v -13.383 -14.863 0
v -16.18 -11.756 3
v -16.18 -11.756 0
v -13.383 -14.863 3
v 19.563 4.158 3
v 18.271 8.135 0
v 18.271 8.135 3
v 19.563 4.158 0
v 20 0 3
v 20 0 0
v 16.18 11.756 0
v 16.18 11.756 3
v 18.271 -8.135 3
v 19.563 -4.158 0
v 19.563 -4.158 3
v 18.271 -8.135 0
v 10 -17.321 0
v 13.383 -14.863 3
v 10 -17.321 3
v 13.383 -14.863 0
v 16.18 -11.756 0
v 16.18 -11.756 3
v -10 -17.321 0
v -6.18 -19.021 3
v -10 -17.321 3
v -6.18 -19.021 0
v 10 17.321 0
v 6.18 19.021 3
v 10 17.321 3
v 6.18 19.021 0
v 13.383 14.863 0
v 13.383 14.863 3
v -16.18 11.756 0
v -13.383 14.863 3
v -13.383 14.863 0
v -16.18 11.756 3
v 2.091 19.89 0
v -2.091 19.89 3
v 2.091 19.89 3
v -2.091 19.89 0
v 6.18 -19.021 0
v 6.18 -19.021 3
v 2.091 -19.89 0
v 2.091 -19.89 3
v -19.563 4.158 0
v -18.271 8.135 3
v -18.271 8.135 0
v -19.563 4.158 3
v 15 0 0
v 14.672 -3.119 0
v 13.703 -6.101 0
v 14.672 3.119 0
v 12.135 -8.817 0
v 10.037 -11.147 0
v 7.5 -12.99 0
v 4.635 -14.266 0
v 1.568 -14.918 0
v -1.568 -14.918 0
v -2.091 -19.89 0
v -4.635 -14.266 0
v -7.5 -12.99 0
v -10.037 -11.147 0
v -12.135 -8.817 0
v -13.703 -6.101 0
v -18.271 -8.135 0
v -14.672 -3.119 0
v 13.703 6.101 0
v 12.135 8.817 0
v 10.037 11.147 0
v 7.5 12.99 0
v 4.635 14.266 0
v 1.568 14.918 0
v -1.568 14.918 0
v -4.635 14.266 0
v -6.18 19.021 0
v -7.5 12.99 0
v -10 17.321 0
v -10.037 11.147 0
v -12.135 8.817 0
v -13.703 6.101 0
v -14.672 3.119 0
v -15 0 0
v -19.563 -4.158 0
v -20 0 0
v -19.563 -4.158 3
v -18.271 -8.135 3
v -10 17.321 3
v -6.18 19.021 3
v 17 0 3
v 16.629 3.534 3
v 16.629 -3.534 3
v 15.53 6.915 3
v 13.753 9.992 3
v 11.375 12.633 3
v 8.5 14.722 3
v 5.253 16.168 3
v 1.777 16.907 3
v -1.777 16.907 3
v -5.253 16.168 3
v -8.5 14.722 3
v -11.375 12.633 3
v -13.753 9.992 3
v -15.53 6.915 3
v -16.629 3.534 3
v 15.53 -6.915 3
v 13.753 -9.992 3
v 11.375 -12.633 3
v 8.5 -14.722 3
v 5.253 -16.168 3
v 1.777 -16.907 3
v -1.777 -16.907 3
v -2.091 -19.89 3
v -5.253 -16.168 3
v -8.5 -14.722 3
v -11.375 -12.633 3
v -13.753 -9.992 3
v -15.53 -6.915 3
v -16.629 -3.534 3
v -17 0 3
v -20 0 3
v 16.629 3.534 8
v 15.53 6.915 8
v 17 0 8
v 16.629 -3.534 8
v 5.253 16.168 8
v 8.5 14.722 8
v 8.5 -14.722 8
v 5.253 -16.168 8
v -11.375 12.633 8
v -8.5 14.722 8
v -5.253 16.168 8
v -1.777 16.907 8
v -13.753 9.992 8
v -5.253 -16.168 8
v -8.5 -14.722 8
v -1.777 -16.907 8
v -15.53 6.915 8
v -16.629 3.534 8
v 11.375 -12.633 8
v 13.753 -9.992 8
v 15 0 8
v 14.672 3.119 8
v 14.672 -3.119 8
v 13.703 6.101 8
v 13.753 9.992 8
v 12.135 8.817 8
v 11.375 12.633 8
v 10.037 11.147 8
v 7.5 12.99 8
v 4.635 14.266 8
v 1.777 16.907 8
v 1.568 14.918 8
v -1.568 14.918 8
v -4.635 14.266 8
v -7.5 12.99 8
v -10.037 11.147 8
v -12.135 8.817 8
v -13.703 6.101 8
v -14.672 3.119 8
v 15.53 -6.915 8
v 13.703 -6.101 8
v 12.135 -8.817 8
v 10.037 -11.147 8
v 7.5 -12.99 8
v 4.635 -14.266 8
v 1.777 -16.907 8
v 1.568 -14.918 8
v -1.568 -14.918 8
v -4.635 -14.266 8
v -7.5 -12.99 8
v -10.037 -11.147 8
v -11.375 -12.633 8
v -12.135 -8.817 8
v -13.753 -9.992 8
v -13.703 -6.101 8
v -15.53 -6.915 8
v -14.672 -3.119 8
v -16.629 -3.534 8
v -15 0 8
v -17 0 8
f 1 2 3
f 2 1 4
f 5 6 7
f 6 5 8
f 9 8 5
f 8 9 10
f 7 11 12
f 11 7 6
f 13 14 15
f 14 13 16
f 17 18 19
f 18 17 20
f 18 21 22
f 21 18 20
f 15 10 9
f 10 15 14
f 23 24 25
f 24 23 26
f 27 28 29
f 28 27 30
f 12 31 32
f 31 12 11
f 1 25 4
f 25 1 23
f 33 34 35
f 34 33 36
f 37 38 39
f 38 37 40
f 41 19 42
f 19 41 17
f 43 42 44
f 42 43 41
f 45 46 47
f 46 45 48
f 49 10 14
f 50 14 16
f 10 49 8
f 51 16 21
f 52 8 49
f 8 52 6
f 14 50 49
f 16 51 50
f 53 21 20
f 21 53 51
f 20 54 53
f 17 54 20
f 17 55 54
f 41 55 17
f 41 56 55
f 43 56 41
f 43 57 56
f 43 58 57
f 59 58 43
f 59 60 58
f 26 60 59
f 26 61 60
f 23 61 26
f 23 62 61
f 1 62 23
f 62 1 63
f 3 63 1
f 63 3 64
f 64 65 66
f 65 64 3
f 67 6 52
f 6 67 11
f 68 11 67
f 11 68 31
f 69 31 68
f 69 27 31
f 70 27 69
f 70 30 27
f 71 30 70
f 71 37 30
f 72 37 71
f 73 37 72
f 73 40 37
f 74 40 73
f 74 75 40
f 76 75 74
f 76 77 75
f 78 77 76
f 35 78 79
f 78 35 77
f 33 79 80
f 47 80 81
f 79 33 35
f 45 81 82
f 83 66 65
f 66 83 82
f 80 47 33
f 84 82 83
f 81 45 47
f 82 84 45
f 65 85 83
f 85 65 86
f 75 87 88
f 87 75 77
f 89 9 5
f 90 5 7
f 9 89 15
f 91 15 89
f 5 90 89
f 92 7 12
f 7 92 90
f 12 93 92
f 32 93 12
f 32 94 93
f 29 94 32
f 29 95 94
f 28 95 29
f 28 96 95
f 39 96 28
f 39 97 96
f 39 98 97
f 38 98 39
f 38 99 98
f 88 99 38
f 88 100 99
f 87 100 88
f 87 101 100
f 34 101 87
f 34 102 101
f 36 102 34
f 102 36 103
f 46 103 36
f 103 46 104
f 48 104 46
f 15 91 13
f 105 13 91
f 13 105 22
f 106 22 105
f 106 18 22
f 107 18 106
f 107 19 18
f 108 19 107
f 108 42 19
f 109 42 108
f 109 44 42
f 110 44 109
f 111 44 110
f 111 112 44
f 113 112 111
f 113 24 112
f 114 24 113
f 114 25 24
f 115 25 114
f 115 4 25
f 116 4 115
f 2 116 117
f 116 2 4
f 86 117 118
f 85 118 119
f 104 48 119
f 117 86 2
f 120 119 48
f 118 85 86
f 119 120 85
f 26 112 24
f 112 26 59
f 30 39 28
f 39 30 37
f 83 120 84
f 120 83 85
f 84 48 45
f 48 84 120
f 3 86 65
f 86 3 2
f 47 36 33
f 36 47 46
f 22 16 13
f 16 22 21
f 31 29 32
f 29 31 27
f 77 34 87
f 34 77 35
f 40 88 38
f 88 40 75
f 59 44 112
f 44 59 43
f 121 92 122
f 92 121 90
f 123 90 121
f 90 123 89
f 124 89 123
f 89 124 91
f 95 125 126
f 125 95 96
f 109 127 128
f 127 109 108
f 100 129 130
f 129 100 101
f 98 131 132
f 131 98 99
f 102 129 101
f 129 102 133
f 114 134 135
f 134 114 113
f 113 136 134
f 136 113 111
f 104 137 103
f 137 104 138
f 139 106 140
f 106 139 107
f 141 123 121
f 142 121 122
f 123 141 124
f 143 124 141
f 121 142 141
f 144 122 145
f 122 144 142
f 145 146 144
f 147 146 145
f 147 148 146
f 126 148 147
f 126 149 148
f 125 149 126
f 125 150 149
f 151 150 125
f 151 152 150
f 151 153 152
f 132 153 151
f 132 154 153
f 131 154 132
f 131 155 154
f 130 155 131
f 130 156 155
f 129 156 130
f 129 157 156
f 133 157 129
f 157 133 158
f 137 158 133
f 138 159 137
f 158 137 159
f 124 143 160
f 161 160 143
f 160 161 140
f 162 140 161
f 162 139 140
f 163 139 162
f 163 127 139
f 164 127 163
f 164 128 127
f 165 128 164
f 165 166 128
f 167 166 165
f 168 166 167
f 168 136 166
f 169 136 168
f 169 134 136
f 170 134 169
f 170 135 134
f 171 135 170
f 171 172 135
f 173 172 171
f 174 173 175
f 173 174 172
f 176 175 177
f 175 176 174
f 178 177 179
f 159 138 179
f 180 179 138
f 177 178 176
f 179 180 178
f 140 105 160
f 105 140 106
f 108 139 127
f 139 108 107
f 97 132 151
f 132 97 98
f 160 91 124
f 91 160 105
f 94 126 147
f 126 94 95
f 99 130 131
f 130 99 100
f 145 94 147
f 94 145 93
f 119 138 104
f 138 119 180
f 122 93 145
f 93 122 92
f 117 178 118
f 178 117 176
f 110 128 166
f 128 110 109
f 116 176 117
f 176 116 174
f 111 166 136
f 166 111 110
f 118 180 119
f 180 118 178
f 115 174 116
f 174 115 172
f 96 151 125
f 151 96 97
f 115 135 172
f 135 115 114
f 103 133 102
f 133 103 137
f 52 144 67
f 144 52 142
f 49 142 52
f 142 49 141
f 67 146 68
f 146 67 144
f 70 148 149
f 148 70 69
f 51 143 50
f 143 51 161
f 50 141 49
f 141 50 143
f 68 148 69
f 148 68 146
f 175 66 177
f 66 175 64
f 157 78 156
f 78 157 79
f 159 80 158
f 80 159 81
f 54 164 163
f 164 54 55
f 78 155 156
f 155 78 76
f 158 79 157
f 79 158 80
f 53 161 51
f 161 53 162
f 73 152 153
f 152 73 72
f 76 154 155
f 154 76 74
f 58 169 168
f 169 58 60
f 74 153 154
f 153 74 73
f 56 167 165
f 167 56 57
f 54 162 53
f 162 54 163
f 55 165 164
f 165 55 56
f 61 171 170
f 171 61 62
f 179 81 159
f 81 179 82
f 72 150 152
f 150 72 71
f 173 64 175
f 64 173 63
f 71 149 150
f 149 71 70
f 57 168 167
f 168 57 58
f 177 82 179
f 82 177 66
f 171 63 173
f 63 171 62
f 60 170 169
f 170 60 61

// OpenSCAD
magnet_d = 40;
magnet_r = magnet_d / 2;
base_t = 3;
magnet_gap = 1;

hole_d = 30;
hole_r = hole_d / 2;
rim_d = hole_d + 10;
rim_r = rim_d / 2;
insert_h = 5;
insert_t = 2;
insert_r = hole_r + insert_t;


module base() {
    hull(){
    cylinder(r=magnet_r, h=base_t);
    translate([magnet_d + magnet_gap, 0, 0])
    cylinder(r=magnet_r, h=base_t);
    }
}

module ring() {
    difference() {
        union() {
            cylinder(r=rim_r, h=base_t);
            cylinder(r=insert_r, h=insert_h + base_t);
        }
        translate([0, 0, -1])
        cylinder(r=hole_r, h=base_t + insert_h + 2);
    }
}

ring();
